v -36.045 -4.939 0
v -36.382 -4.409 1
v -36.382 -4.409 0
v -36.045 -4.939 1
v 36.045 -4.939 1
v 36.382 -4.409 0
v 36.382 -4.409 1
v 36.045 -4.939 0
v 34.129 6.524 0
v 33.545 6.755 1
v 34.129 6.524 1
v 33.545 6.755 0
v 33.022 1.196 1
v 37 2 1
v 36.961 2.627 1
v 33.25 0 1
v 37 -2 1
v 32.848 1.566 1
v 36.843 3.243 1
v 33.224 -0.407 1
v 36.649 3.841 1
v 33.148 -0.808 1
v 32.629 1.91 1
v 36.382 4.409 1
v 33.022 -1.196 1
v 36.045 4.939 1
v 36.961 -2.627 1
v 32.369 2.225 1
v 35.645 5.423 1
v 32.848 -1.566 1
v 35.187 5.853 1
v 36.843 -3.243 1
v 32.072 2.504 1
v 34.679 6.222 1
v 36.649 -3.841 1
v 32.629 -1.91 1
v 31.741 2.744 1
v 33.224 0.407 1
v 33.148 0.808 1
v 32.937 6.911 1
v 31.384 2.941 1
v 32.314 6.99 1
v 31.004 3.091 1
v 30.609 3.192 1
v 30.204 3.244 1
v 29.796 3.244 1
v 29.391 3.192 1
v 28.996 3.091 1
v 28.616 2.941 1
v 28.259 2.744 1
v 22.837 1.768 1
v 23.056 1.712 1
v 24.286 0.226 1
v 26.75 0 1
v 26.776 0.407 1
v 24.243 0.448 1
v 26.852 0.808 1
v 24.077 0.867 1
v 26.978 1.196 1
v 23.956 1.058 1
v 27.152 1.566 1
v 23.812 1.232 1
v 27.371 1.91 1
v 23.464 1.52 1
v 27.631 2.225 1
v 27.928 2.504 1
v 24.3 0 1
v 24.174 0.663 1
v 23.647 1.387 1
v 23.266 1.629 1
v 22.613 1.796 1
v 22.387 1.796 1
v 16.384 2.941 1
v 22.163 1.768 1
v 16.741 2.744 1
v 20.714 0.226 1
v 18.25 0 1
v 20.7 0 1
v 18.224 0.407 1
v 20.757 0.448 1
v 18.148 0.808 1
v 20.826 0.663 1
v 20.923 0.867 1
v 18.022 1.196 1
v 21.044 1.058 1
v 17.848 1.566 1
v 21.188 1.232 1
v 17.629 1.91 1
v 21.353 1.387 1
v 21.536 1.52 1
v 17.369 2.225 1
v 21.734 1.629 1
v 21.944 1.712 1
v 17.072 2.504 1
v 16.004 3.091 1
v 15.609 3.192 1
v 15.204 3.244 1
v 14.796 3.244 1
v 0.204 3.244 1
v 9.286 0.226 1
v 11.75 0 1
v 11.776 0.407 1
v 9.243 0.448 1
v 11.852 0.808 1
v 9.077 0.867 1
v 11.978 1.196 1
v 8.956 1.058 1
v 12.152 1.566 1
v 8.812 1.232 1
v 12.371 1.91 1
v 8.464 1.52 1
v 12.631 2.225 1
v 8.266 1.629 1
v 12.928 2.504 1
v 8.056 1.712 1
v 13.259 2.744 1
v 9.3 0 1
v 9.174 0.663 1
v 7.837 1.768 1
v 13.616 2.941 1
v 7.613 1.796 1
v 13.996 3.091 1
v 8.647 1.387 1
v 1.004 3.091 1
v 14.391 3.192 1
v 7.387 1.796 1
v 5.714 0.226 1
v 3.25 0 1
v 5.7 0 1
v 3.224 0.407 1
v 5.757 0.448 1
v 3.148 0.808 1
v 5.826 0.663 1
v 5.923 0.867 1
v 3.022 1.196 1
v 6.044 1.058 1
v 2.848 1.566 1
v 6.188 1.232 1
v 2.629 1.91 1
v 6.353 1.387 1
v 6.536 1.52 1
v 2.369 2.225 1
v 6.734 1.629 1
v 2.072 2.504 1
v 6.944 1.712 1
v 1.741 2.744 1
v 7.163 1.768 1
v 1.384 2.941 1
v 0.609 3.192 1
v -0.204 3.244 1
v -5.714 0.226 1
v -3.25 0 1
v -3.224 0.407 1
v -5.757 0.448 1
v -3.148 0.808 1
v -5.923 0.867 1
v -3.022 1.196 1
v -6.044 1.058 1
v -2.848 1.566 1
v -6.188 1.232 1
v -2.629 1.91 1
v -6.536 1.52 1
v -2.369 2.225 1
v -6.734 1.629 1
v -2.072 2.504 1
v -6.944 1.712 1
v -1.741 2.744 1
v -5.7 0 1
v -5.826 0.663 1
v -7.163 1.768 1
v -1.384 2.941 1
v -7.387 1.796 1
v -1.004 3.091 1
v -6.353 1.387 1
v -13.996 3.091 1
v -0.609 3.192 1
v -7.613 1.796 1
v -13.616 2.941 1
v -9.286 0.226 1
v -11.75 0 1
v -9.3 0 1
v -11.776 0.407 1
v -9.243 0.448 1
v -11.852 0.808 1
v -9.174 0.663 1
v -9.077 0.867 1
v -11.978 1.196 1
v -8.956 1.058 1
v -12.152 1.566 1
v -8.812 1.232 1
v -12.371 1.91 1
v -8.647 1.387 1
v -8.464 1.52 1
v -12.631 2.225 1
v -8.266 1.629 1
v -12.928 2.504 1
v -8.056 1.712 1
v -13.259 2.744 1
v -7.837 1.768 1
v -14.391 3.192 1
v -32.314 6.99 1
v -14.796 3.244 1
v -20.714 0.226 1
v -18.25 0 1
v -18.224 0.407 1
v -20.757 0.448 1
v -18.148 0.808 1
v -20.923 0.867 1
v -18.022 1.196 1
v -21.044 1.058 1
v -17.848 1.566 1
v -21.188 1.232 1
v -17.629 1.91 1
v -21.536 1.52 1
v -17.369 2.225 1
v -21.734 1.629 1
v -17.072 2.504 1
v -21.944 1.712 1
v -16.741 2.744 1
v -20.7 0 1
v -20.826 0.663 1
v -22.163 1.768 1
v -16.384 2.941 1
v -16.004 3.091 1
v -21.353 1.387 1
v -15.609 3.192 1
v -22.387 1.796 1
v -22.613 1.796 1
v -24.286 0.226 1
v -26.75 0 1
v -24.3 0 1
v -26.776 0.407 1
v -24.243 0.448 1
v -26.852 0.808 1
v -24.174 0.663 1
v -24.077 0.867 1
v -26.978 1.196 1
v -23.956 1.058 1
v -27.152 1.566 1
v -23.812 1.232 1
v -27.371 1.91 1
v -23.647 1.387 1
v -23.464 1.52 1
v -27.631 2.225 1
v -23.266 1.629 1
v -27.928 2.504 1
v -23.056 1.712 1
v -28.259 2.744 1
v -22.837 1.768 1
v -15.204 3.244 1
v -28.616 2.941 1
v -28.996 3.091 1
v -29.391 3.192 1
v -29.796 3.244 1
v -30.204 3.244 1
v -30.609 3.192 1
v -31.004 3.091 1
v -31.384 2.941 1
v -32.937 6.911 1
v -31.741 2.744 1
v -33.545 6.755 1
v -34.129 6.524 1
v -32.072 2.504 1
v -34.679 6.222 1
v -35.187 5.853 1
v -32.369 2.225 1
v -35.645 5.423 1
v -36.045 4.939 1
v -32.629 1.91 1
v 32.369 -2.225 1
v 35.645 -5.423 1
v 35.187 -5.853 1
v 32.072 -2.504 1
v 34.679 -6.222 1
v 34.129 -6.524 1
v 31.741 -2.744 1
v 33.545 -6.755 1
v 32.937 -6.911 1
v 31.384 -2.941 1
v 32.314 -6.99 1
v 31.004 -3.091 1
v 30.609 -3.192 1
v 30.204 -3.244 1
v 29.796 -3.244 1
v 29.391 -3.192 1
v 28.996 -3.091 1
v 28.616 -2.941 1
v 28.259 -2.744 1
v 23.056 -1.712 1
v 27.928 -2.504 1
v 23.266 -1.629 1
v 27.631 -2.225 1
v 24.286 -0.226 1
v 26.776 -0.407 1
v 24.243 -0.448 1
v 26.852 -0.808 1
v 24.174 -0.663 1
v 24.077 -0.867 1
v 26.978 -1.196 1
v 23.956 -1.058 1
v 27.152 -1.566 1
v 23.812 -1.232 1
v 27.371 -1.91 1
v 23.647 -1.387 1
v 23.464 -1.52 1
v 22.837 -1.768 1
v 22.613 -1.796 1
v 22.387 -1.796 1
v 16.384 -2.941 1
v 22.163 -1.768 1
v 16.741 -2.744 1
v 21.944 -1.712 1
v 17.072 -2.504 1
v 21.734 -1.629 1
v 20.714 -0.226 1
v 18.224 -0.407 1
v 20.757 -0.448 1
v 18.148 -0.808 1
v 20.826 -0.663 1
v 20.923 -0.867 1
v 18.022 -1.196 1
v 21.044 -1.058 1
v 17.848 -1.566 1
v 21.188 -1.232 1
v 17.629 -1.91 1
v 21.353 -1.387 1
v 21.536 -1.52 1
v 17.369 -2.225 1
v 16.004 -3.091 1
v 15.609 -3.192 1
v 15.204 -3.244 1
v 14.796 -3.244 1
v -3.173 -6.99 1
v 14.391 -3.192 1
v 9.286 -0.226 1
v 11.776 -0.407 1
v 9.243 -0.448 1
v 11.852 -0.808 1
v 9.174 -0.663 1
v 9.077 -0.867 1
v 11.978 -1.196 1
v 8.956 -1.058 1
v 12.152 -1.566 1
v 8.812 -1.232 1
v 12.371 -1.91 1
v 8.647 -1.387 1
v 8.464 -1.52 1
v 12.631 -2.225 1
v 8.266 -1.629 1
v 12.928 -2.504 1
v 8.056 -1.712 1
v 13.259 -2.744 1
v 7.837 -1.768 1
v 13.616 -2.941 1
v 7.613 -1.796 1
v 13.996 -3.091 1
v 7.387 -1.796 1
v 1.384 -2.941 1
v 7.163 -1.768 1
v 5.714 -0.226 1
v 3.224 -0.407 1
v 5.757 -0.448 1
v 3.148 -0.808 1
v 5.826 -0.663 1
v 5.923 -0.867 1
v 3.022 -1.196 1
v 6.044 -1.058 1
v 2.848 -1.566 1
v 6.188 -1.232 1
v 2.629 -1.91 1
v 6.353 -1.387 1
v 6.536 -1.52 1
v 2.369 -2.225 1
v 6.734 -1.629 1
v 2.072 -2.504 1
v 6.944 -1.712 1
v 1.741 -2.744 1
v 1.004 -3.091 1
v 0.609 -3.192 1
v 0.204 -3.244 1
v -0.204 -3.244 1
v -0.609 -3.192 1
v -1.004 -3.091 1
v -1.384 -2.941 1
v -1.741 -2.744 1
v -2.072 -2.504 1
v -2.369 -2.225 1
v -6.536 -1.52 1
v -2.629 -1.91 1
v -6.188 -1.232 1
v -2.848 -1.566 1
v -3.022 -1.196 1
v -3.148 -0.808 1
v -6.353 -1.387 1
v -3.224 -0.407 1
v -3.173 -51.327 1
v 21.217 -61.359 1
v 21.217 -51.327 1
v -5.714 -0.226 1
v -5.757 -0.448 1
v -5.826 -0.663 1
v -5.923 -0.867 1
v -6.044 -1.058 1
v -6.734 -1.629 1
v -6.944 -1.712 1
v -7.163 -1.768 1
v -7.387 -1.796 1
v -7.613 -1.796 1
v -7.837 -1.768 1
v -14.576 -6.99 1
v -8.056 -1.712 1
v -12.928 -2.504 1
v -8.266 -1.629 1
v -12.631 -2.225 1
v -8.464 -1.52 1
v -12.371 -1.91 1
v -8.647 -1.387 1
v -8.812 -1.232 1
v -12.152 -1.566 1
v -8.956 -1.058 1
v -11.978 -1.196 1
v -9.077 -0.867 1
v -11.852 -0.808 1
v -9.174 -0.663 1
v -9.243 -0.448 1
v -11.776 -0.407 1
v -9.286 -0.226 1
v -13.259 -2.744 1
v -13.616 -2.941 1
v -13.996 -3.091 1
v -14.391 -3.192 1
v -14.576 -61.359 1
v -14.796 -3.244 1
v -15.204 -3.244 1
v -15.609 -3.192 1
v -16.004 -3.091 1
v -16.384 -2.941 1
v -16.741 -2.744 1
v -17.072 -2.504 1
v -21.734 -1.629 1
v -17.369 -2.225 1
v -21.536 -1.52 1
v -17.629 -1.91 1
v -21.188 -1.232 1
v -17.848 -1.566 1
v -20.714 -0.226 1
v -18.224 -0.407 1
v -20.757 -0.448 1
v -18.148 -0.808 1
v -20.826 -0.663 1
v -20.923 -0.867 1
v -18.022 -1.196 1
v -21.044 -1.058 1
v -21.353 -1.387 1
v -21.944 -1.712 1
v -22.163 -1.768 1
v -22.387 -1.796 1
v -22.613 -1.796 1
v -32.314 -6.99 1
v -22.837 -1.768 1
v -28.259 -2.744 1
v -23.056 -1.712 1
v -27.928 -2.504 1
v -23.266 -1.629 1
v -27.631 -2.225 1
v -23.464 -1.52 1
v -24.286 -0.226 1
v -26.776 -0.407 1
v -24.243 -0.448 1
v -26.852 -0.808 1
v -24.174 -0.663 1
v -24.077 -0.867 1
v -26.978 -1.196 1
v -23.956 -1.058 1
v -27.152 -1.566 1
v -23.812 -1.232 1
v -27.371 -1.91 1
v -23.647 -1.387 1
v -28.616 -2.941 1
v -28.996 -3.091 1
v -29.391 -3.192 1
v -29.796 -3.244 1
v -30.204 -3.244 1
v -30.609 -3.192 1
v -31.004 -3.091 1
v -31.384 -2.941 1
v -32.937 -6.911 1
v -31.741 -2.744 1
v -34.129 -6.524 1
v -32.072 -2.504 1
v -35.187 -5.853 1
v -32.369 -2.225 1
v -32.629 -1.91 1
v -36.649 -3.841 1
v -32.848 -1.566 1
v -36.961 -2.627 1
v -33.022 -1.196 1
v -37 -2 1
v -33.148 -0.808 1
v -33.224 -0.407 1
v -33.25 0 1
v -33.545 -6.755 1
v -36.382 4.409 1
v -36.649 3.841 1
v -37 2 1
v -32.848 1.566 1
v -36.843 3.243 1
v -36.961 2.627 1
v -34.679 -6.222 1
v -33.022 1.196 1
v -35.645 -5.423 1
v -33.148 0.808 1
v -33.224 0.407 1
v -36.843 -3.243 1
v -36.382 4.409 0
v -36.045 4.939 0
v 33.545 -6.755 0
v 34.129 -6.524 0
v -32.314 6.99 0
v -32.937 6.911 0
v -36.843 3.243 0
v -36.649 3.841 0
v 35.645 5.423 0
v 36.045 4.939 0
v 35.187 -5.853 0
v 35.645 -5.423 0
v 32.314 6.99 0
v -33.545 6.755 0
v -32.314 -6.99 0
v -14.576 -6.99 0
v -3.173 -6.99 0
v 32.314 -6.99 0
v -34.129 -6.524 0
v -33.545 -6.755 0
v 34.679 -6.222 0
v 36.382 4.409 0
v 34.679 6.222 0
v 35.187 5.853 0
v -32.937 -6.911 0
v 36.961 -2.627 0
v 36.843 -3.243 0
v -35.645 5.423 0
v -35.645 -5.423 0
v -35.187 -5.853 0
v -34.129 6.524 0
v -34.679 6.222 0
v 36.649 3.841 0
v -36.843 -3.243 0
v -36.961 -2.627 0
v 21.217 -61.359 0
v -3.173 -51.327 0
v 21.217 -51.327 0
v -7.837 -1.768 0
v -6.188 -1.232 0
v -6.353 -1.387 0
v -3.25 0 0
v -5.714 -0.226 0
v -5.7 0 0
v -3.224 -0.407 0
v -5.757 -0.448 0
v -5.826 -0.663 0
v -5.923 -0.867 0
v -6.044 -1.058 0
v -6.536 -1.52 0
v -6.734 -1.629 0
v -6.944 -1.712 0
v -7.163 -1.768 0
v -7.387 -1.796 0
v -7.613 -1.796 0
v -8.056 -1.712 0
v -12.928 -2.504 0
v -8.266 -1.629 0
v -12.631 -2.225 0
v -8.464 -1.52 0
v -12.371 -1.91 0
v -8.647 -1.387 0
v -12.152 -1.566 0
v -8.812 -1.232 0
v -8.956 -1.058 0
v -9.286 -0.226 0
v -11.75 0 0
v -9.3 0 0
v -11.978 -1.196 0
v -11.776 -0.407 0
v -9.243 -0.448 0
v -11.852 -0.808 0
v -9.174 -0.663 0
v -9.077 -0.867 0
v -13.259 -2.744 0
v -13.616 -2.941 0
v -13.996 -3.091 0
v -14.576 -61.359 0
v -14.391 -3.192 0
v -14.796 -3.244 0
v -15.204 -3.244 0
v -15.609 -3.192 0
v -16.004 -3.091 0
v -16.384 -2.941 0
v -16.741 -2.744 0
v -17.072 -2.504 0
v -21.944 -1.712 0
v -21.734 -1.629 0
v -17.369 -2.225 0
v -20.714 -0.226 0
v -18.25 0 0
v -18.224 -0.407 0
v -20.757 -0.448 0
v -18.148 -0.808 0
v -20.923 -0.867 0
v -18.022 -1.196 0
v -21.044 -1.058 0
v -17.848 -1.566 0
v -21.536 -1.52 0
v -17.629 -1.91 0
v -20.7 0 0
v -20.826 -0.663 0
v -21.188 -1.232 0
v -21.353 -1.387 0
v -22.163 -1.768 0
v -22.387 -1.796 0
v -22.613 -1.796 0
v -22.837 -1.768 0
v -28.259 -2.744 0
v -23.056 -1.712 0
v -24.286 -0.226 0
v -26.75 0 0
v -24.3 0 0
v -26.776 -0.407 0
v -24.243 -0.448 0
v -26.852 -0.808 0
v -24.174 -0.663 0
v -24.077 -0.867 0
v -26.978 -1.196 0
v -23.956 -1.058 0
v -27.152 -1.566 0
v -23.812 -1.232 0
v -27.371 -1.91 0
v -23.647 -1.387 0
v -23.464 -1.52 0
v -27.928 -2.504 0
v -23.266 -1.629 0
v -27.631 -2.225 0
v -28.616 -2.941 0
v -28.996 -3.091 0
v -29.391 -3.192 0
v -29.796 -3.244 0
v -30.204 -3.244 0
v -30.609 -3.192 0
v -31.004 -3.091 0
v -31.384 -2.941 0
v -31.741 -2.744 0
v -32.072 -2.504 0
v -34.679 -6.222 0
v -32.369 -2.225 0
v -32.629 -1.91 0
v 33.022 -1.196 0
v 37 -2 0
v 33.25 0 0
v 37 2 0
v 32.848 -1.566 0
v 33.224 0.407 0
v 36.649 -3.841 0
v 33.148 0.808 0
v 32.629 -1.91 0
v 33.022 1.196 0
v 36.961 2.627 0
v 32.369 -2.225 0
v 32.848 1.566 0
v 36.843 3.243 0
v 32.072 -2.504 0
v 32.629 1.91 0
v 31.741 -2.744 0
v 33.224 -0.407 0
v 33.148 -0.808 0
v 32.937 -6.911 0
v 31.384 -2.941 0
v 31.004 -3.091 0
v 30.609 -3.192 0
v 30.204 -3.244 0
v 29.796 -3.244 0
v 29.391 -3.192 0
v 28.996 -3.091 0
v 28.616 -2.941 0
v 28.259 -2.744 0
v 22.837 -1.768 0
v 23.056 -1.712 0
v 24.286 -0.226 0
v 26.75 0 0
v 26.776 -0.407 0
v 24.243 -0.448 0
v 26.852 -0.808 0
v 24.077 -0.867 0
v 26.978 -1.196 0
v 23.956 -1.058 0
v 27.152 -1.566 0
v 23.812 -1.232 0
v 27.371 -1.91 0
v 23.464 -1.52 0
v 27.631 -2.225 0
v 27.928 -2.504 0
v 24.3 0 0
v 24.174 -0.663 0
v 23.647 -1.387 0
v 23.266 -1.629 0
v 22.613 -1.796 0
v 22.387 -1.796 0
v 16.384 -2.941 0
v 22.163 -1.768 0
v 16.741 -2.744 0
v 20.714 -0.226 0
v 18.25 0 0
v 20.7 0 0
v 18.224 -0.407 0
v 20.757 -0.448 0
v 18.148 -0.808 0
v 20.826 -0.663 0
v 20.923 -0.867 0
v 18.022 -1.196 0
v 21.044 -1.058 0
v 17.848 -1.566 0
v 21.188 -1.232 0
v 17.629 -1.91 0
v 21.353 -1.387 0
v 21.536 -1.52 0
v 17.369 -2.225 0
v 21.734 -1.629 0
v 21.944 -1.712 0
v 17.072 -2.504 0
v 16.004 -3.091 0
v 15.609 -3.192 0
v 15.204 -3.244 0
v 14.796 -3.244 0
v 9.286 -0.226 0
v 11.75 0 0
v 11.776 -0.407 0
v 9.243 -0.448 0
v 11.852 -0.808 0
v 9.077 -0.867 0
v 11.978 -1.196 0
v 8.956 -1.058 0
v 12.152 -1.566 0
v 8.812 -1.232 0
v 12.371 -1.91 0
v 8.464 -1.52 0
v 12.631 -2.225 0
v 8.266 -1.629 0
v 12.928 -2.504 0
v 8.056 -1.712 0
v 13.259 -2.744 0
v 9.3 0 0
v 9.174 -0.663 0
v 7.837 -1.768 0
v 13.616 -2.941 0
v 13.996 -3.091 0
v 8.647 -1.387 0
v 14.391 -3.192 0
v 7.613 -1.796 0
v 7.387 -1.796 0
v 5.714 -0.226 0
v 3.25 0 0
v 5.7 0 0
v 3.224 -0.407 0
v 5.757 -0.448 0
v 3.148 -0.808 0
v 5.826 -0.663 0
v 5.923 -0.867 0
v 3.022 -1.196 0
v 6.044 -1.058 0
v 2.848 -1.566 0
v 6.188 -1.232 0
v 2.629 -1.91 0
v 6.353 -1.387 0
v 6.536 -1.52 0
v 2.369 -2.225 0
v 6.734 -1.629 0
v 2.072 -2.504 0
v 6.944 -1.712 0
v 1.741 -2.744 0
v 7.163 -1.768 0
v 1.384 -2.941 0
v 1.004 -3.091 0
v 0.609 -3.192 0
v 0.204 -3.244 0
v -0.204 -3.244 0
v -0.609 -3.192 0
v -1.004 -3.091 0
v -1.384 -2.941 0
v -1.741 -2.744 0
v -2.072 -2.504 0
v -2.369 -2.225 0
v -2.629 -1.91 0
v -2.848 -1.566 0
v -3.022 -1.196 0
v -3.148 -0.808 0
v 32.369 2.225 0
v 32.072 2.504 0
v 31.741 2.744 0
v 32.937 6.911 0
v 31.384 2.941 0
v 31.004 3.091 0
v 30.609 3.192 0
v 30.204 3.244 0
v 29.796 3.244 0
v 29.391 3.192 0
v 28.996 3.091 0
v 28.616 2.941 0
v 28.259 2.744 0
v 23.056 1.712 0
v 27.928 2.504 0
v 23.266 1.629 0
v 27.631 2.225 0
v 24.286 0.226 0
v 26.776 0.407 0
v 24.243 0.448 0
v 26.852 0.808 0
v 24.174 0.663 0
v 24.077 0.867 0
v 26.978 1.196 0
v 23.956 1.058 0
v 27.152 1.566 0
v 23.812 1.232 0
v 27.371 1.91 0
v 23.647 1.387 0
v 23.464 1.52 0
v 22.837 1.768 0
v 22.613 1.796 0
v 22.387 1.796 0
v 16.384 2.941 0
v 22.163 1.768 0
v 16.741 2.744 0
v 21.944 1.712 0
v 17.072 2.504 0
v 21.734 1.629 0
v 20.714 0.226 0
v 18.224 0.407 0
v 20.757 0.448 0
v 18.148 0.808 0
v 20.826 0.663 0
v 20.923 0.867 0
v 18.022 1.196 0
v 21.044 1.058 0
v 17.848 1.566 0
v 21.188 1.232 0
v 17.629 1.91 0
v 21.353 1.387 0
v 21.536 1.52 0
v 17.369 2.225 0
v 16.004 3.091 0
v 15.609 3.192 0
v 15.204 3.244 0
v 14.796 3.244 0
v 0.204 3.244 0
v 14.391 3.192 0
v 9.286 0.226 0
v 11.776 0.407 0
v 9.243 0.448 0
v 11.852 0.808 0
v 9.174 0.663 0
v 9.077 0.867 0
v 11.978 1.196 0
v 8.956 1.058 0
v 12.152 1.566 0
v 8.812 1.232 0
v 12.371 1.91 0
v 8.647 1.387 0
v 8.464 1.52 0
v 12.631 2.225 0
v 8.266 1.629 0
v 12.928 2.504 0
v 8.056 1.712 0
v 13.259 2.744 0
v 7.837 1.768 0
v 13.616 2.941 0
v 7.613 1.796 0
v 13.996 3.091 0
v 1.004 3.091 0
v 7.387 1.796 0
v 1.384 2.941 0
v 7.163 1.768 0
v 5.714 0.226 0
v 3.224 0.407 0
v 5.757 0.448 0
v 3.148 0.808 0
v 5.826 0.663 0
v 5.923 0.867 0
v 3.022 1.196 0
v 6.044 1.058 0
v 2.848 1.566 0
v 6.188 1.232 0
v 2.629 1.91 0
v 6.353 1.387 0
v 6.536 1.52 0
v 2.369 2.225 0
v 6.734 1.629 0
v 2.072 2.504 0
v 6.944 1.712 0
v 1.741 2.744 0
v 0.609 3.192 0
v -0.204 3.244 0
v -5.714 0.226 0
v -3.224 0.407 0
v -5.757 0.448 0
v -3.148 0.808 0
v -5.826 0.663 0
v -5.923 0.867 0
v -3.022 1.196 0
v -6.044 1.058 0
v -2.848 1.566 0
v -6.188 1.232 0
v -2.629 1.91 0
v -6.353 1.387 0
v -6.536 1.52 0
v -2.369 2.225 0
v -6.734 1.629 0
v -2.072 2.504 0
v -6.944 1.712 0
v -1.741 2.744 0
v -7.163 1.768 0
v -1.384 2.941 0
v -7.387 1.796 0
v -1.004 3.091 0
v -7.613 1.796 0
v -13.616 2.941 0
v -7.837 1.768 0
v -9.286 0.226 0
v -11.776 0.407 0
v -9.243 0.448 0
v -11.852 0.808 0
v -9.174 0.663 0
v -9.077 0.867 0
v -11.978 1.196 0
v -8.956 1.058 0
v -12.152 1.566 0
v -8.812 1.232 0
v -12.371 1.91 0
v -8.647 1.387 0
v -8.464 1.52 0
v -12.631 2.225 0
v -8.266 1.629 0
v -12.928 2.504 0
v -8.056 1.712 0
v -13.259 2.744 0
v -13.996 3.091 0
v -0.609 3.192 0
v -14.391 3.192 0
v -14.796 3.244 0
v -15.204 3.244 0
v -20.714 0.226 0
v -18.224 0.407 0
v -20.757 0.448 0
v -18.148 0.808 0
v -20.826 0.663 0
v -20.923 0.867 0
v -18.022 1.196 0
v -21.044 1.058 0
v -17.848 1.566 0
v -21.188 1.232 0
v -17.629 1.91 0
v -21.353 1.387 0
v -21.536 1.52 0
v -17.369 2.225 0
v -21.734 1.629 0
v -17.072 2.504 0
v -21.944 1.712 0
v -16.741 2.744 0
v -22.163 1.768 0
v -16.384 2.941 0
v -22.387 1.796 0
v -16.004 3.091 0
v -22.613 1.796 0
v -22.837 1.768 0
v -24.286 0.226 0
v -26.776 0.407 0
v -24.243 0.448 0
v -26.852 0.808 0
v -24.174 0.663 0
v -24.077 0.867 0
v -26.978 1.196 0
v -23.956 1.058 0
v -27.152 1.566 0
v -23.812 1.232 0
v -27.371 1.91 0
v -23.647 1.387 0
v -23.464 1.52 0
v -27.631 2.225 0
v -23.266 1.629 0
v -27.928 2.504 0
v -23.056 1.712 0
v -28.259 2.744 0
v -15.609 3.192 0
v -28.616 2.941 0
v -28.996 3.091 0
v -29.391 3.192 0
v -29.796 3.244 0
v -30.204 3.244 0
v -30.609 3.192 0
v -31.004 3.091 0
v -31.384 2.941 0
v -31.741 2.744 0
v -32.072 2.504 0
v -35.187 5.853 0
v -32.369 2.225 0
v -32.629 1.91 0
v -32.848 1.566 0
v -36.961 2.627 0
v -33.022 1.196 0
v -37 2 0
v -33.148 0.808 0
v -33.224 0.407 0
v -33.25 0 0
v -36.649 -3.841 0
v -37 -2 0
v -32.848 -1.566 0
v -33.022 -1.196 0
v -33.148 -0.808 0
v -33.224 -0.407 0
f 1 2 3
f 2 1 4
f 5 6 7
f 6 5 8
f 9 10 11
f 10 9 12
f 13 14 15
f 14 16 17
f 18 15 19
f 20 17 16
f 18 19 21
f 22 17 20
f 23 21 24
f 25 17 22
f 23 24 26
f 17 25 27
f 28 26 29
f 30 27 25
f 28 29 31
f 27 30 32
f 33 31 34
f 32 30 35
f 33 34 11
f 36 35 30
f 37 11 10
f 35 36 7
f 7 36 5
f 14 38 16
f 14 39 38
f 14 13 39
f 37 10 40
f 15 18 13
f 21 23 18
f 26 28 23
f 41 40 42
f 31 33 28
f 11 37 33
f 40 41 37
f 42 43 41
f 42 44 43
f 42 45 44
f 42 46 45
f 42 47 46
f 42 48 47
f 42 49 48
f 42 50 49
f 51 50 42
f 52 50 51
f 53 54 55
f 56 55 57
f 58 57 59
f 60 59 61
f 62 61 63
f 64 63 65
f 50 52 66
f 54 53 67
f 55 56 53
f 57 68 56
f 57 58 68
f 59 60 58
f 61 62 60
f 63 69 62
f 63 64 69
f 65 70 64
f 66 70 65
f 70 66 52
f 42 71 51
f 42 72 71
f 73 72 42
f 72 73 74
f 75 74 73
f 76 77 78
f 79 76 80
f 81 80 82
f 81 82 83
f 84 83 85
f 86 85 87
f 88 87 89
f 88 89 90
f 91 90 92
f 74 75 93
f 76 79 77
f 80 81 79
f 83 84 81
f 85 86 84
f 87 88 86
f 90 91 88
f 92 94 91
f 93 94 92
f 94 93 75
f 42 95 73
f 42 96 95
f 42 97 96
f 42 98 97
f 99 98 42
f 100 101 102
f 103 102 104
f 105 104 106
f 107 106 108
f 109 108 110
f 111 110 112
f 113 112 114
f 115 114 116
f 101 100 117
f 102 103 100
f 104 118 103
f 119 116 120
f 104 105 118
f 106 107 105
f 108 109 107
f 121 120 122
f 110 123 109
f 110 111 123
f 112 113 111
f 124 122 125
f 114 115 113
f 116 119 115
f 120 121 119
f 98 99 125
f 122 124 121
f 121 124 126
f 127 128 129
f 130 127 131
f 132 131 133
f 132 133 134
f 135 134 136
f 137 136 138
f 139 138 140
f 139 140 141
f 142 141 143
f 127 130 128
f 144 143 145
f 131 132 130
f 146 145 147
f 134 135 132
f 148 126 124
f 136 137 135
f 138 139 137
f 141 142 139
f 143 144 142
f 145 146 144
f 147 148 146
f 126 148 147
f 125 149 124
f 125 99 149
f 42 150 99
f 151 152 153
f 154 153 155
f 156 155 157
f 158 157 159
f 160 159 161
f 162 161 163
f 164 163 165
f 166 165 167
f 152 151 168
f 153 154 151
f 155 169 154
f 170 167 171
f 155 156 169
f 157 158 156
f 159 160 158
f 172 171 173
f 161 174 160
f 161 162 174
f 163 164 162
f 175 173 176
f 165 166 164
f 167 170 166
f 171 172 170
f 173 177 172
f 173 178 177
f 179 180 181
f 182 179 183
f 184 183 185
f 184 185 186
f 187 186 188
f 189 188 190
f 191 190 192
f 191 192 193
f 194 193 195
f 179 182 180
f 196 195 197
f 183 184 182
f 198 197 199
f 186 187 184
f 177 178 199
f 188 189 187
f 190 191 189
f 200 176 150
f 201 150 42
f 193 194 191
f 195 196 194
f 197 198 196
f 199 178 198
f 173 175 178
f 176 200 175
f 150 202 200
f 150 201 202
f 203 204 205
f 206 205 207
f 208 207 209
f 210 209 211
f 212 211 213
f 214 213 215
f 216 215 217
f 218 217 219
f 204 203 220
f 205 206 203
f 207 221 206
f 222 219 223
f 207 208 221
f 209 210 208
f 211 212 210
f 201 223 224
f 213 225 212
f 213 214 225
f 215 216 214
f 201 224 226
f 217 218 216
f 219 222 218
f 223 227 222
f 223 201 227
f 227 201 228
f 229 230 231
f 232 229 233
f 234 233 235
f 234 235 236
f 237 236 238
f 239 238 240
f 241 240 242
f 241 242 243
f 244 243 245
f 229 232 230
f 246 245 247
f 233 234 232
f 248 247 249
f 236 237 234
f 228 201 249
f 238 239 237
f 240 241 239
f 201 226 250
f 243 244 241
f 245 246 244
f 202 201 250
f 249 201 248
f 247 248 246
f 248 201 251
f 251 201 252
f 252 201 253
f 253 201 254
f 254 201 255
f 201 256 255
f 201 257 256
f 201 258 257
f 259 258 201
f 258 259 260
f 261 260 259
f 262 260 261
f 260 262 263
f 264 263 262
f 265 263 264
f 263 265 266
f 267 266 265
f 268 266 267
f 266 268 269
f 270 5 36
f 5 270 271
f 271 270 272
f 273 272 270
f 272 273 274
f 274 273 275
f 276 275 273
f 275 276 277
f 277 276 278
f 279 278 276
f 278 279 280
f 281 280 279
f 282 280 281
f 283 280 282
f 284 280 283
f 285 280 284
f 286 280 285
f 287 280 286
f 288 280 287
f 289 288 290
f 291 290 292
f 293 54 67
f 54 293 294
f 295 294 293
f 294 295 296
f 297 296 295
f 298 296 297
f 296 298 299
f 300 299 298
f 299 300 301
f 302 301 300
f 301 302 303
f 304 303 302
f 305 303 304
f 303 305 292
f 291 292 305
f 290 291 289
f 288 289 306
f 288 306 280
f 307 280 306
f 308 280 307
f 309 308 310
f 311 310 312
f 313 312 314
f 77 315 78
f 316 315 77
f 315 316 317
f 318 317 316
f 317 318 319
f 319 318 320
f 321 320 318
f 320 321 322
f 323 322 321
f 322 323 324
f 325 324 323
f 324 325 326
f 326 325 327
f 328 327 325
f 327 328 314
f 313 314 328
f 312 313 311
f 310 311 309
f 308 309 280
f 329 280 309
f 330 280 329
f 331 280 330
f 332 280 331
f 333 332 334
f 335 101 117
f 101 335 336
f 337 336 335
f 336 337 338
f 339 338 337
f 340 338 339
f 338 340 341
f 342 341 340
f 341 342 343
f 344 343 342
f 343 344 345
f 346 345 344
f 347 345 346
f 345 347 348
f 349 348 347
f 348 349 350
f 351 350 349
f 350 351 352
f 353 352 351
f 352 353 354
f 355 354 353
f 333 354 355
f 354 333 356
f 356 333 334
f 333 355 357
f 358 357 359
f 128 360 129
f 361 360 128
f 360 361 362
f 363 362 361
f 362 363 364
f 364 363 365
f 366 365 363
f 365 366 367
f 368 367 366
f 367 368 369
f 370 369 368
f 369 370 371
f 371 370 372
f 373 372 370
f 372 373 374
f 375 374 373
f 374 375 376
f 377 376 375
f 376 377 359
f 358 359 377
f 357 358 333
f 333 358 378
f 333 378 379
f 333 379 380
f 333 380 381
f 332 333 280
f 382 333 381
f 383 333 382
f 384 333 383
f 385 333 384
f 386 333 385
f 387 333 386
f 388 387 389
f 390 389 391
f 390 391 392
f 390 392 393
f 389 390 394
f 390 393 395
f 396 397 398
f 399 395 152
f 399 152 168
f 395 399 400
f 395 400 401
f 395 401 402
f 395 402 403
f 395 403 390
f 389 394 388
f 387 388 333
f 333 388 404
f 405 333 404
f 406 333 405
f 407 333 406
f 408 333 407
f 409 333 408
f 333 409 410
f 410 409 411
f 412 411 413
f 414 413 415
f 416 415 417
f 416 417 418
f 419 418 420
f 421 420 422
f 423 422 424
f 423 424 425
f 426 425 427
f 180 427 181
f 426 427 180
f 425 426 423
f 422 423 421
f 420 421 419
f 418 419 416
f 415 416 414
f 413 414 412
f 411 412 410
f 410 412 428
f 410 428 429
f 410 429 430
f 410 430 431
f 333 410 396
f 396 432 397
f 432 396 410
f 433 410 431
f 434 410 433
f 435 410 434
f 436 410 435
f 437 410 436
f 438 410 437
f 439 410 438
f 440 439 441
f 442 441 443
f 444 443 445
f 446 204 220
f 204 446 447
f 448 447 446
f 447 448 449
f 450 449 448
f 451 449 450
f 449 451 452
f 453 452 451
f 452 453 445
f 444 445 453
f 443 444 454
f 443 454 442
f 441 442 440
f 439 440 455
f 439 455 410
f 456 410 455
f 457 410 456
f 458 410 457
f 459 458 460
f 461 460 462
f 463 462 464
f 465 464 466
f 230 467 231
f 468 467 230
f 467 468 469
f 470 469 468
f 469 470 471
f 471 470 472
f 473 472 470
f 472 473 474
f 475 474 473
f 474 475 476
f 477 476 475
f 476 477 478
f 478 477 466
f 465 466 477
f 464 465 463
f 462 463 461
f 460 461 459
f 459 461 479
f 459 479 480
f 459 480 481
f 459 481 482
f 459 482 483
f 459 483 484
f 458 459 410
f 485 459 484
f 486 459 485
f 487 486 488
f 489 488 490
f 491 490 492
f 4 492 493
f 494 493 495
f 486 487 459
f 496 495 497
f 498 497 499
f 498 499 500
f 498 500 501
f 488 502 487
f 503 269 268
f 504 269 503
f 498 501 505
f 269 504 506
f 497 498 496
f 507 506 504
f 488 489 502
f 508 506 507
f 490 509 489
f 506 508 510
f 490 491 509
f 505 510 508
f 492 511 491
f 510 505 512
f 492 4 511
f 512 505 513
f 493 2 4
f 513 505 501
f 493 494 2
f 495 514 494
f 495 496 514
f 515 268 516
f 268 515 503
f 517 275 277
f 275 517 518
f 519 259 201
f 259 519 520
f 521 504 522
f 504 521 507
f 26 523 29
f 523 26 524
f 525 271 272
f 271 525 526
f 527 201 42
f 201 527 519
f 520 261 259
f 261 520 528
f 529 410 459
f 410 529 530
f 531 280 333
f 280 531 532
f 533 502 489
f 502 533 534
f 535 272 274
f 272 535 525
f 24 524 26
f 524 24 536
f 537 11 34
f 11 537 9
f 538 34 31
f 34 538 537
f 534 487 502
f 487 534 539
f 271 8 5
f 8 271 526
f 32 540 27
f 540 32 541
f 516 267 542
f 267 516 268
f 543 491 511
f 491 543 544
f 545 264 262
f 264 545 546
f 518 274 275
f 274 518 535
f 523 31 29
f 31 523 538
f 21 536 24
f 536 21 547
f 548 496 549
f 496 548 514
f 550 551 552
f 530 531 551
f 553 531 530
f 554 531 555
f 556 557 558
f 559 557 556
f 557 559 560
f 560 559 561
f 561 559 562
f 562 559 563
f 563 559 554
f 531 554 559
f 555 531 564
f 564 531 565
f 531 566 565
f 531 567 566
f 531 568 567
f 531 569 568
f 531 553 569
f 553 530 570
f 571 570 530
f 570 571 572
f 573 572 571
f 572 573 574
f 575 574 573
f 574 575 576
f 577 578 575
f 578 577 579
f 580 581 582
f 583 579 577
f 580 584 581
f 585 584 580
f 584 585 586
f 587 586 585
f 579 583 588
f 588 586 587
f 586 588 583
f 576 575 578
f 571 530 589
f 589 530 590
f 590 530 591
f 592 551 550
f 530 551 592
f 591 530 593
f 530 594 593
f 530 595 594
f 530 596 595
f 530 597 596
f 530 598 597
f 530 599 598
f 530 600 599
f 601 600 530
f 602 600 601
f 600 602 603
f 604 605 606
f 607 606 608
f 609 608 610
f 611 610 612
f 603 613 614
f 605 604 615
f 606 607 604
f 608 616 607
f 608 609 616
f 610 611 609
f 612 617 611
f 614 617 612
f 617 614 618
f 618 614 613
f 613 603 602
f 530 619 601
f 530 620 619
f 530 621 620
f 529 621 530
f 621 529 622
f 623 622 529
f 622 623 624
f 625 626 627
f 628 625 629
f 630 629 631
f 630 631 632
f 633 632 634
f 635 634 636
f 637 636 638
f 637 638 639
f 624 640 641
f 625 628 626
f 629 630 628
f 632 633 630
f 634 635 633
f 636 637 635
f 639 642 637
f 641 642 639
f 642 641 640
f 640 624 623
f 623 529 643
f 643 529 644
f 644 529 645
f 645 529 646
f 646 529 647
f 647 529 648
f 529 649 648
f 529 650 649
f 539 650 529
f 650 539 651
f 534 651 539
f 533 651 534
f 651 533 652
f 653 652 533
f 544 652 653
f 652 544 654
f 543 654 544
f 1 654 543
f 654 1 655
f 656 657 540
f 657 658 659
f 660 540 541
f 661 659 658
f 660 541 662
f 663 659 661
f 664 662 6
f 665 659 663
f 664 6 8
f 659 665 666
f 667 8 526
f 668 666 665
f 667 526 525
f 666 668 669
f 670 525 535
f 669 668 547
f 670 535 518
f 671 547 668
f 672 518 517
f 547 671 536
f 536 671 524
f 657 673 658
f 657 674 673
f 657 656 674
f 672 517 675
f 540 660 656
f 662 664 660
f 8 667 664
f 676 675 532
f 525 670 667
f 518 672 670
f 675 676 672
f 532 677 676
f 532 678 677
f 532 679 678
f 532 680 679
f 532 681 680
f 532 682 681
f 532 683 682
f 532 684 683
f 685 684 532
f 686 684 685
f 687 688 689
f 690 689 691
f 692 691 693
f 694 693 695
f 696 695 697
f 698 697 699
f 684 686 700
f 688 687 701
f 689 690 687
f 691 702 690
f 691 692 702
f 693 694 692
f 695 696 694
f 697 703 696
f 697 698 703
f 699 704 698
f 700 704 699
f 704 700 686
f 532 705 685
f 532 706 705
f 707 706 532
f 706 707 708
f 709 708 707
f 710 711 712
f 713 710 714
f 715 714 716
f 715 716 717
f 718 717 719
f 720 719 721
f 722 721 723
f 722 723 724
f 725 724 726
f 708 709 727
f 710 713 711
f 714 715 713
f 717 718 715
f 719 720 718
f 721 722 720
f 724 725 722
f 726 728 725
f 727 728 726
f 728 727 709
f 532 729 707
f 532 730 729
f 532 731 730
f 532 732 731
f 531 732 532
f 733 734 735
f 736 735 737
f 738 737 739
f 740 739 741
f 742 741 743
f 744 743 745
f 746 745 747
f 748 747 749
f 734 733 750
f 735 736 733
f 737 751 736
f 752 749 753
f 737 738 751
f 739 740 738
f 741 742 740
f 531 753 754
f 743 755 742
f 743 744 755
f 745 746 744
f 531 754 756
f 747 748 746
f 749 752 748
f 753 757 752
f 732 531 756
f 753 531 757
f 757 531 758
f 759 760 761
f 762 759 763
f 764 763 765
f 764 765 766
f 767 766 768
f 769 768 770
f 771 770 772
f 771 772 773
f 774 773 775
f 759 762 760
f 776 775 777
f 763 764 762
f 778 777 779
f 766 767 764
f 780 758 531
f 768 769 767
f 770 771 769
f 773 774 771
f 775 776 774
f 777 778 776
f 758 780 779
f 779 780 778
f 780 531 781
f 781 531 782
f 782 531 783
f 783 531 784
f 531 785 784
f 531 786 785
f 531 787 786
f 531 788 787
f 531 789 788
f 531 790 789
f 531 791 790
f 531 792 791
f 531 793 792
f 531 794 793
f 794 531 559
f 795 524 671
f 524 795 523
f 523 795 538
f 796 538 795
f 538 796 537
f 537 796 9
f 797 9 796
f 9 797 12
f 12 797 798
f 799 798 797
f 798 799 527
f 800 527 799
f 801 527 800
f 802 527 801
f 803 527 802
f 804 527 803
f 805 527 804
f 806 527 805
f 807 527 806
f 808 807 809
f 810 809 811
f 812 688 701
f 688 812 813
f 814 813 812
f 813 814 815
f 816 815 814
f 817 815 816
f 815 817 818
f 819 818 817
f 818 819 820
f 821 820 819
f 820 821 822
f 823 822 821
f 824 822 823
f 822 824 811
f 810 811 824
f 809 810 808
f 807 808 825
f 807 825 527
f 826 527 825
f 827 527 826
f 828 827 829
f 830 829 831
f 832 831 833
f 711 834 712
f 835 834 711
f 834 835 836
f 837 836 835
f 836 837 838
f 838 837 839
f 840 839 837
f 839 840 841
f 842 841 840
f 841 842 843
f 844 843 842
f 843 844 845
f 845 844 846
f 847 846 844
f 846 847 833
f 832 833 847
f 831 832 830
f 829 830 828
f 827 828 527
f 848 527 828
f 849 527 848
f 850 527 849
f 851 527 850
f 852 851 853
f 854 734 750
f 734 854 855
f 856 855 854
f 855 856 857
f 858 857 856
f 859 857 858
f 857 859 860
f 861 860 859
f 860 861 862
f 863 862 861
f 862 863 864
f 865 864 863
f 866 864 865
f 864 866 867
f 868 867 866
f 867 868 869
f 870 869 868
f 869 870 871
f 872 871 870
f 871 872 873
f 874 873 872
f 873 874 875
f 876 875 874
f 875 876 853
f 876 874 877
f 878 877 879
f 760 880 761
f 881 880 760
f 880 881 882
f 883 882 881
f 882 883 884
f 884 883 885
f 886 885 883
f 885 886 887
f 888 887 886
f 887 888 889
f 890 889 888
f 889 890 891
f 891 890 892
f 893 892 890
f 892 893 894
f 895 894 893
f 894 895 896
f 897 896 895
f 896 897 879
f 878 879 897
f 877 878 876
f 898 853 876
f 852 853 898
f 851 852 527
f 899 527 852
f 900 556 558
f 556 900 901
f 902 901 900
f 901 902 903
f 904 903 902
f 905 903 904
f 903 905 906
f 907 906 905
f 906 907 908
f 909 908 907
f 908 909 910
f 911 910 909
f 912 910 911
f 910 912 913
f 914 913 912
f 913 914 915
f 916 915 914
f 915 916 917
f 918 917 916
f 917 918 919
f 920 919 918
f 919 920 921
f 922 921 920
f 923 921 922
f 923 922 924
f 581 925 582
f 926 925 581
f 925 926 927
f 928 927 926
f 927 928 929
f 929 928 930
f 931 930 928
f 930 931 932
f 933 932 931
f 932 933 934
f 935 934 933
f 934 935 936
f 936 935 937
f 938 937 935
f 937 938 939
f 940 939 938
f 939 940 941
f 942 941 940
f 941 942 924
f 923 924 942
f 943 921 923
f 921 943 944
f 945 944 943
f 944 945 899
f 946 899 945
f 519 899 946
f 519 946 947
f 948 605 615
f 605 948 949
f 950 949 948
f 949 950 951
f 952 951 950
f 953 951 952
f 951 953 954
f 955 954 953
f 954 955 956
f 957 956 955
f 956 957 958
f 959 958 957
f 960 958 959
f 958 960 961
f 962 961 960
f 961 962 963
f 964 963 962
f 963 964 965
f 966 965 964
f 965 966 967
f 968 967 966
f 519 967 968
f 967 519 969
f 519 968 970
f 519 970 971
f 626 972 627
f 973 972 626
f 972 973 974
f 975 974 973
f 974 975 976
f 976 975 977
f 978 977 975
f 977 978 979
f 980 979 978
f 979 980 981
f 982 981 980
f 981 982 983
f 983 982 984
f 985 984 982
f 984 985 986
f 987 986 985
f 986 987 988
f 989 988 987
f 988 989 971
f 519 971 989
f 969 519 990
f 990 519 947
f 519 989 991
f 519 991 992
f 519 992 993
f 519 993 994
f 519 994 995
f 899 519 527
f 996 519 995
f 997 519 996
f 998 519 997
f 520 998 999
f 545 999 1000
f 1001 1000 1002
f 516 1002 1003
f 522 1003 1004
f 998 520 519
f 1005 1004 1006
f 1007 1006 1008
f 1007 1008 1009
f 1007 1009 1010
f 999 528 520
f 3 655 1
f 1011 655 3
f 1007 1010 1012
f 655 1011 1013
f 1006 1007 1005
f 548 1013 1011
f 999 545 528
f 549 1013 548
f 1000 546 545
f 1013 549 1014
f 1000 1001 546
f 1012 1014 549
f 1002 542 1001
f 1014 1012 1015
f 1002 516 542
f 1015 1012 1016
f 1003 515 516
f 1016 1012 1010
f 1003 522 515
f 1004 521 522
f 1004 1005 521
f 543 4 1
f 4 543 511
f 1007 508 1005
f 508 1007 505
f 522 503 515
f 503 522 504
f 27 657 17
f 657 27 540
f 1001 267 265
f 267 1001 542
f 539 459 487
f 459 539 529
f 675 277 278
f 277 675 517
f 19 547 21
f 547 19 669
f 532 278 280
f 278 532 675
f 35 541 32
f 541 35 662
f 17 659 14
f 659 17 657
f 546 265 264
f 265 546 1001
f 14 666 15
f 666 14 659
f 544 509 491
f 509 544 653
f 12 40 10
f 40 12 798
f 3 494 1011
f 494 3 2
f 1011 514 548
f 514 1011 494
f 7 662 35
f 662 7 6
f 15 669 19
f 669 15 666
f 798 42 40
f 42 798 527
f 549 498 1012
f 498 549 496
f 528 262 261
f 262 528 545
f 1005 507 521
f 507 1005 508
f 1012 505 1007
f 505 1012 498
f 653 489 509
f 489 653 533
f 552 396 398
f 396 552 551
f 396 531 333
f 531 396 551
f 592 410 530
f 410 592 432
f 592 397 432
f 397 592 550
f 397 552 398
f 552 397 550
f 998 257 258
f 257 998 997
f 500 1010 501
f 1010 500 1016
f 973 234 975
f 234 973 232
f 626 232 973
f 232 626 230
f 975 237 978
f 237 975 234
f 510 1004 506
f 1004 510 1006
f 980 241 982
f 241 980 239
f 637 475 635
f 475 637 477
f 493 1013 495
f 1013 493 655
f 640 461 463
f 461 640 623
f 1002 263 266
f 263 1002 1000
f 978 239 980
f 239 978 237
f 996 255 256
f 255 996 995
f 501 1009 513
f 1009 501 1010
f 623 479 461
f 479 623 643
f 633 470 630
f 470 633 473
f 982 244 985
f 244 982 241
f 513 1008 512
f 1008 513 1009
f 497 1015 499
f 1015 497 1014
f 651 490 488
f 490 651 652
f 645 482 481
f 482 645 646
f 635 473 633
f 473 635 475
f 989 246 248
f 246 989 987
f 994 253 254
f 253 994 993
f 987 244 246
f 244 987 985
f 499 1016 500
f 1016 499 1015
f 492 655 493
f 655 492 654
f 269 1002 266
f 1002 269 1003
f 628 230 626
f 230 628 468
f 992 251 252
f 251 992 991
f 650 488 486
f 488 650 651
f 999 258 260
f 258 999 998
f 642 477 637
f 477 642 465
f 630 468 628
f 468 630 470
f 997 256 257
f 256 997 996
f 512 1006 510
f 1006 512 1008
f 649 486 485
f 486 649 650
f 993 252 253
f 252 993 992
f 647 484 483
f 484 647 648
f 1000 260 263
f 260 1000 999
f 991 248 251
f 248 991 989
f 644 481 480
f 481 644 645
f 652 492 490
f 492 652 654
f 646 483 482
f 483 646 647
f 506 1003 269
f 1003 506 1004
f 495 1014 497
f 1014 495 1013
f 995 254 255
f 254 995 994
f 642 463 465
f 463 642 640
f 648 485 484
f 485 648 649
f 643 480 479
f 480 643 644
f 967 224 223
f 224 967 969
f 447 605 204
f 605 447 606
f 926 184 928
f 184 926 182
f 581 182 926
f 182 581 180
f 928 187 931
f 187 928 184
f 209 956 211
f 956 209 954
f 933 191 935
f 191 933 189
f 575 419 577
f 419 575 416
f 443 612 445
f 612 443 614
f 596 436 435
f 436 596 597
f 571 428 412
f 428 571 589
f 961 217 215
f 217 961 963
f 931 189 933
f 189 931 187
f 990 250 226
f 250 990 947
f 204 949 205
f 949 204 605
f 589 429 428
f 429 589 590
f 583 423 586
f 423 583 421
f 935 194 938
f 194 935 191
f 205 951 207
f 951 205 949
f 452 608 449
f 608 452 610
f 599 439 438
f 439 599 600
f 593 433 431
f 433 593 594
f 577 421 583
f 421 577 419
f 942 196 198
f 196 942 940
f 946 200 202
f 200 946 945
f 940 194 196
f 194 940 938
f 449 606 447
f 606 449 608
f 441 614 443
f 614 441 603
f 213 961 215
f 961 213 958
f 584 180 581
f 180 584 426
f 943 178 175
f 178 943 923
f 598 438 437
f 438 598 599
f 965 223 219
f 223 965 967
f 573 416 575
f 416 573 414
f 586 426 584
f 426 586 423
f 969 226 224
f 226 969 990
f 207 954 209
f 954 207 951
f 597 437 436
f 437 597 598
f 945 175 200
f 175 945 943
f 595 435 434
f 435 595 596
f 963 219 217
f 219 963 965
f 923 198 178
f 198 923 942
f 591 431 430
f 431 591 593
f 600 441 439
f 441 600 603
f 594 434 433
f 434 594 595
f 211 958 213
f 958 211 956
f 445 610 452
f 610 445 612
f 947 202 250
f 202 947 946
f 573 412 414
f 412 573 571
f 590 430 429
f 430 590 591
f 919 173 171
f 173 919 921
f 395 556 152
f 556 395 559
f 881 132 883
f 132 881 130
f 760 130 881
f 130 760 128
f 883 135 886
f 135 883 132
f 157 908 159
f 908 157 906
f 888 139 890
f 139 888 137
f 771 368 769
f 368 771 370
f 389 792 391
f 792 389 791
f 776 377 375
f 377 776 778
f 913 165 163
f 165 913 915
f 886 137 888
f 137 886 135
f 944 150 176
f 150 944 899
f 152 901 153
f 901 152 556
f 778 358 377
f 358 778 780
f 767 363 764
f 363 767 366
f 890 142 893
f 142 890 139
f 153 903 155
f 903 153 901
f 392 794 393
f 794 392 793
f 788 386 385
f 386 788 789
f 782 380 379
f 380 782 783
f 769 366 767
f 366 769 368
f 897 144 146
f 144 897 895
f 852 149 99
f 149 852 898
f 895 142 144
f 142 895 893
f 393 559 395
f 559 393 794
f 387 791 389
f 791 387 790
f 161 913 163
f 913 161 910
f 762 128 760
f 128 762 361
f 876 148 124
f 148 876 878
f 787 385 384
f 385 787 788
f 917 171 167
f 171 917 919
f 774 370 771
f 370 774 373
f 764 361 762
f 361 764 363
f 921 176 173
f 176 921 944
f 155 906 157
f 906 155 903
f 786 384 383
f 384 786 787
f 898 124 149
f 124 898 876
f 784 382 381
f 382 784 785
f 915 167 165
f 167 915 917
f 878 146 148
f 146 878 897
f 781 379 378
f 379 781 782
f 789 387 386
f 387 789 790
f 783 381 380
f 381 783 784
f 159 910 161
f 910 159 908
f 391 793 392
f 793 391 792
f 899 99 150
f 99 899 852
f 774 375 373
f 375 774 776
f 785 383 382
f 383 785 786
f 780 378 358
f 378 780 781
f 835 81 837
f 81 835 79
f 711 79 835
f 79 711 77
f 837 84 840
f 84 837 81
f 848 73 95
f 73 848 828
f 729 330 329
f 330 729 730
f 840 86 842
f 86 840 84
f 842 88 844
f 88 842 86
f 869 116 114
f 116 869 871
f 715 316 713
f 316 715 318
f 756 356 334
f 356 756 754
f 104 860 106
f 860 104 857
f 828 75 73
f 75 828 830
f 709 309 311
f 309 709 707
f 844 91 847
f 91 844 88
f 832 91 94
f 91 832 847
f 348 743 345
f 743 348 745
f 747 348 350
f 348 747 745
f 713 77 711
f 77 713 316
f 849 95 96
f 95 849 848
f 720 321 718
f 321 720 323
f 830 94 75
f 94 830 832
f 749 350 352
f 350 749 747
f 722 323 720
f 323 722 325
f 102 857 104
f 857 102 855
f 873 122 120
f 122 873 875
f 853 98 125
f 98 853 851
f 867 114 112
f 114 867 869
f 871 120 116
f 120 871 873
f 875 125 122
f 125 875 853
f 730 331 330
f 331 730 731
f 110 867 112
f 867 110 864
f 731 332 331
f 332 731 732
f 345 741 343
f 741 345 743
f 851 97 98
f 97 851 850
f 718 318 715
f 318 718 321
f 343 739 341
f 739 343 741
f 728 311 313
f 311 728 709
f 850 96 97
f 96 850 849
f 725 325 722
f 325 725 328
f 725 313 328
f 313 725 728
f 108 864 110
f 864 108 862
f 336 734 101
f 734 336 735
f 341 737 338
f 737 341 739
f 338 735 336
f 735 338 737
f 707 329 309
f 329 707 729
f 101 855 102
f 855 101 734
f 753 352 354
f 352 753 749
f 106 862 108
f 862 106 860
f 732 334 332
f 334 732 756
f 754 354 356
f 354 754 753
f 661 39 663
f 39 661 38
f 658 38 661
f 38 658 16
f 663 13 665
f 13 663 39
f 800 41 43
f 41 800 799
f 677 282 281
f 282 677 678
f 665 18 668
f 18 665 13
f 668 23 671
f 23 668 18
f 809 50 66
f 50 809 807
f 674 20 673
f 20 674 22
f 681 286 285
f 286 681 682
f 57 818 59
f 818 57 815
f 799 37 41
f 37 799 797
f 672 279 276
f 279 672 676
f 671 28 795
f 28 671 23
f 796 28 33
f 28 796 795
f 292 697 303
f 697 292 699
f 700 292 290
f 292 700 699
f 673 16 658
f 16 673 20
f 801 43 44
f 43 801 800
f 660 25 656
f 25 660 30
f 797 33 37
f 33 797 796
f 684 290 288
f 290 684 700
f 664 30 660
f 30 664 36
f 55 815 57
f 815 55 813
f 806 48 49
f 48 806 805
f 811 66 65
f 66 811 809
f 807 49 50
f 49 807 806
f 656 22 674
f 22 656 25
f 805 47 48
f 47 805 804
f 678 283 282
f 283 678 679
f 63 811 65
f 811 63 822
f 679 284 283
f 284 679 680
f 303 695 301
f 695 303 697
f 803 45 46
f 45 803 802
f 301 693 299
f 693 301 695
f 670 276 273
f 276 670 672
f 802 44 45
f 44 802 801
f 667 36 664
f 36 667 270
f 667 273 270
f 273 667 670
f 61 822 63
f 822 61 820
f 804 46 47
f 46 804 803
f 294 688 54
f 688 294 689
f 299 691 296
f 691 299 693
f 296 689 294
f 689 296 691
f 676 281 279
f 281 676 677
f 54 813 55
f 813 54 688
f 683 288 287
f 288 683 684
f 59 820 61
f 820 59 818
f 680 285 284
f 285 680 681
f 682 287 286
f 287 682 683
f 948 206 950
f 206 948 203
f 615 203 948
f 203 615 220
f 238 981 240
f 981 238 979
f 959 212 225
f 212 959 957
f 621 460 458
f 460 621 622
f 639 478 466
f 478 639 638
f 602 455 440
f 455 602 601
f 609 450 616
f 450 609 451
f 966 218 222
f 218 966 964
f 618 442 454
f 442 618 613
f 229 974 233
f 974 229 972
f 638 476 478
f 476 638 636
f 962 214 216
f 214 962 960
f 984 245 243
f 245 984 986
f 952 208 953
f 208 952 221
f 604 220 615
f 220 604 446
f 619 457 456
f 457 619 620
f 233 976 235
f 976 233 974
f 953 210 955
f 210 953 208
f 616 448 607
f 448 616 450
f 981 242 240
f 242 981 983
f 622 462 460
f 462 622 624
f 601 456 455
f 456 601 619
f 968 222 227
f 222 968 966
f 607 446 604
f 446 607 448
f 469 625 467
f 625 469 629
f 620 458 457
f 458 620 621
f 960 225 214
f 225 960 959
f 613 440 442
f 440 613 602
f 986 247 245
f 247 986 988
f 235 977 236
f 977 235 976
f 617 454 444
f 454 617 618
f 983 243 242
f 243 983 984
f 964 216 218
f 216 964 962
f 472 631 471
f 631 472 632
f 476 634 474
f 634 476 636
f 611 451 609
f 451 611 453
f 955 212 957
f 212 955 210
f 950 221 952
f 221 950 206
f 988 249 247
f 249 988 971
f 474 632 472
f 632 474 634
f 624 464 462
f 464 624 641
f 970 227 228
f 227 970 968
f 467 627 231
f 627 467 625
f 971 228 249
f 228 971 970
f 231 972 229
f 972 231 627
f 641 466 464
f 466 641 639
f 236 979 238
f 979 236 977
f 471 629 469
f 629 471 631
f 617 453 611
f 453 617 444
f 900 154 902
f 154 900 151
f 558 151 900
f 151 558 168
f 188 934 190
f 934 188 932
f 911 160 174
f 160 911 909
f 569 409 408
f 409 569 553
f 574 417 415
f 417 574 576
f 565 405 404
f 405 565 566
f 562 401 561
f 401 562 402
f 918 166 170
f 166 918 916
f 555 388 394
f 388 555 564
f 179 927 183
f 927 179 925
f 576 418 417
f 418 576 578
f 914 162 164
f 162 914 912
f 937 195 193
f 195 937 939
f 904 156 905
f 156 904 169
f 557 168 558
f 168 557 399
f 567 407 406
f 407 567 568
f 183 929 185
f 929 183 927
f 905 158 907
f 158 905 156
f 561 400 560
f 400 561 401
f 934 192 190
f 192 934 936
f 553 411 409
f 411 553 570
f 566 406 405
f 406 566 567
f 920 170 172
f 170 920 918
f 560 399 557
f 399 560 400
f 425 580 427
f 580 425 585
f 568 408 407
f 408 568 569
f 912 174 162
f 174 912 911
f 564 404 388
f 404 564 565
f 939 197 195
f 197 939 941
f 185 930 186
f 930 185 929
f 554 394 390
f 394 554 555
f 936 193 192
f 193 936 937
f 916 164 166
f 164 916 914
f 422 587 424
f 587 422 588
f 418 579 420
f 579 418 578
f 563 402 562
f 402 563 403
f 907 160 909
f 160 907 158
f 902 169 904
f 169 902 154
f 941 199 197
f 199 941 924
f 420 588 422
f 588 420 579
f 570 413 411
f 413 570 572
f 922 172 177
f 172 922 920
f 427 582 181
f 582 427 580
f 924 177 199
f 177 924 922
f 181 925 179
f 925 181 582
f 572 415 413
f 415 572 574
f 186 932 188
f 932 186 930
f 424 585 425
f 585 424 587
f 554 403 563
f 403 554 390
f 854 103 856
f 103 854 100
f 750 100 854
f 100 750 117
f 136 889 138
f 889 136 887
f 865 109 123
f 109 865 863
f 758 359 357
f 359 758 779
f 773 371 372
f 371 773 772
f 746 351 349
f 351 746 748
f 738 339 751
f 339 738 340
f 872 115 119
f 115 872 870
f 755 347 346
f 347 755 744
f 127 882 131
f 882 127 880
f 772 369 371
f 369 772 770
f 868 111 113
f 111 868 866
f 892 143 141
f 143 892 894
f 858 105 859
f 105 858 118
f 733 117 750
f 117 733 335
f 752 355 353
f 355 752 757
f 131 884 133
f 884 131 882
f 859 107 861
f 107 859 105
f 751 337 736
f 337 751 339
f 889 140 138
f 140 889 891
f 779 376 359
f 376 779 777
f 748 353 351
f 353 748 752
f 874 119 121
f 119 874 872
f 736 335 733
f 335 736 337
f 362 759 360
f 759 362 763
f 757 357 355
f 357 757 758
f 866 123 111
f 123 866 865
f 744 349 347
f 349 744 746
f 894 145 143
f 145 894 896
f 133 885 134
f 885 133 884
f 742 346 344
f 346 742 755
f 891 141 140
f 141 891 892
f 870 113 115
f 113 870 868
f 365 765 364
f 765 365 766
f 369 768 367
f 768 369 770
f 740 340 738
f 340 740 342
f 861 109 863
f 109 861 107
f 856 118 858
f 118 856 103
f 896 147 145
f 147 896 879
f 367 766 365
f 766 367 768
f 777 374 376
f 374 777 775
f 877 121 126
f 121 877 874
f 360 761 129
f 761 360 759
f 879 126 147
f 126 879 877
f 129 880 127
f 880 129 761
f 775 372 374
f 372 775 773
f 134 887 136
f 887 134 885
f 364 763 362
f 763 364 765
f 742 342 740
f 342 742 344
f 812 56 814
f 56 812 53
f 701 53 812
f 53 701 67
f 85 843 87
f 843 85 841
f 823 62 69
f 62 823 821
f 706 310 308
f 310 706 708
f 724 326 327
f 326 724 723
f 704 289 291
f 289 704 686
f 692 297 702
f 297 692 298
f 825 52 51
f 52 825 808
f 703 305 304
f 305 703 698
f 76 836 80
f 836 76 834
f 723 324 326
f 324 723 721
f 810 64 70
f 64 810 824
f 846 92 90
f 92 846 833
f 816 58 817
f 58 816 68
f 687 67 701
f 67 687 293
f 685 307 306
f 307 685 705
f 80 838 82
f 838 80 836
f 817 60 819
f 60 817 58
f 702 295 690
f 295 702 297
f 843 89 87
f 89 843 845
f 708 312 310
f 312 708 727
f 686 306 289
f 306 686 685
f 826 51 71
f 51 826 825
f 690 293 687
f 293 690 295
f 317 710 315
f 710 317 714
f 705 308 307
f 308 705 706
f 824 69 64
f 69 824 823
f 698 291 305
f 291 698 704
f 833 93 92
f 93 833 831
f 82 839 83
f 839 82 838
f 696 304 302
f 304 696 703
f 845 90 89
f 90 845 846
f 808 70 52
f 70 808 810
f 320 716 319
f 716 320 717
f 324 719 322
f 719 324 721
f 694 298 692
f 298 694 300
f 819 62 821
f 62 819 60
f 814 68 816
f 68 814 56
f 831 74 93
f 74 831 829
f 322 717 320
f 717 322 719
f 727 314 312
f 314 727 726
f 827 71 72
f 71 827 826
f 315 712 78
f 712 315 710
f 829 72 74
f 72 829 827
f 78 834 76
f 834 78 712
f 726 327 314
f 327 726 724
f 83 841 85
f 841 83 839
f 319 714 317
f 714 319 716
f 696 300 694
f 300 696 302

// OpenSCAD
$fn = 50;


difference() {
	union() {
		*color(alpha = 1.0000000000, c = "gray") {
			translate(v = [0, 14, 0]) {
				linear_extrude(height = 1) {
					text(font = "Arial:style=Bold", halign = "center", size = 4.5000000000, text = "COMMENT description oobb_plate_shape_p_type_1_depth_5_width_1_thickness_l_extra_oobb_size", valign = "center");
				}
			}
		}
		hull() {
			translate(v = [-32.0000000000, 2.0000000000, 0]) {
				cylinder(h = 1, r = 5);
			}
			translate(v = [32.0000000000, 2.0000000000, 0]) {
				cylinder(h = 1, r = 5);
			}
			translate(v = [-32.0000000000, -2.0000000000, 0]) {
				cylinder(h = 1, r = 5);
			}
			translate(v = [32.0000000000, -2.0000000000, 0]) {
				cylinder(h = 1, r = 5);
			}
		}
		translate(v = [0, -5, 0]) {
			linear_extrude(height = 1) {
				text(font = "DejaVu Sans Mono:style=Bold", halign = "center", size = 57.0000000000, text = "L", valign = "top");
			}
		}
	}
	union() {
		*color(alpha = 1.0000000000, c = "gray") {
			translate(v = [0, 14, 0]) {
				linear_extrude(height = 1) {
					text(font = "Arial:style=Bold", halign = "center", size = 4.5000000000, text = "COMMENT description oobb_holes_shape_n_type_5_width_1_thickness_l_extra_oobb_size_1_height_'all'_holes_true_both_holes", valign = "center");
				}
			}
		}
		translate(v = [-30.0000000000, 0.0000000000, 0]) {
			translate(v = [0, 0, -50]) {
				cylinder(h = 100, r = 3.2500000000);
			}
		}
		translate(v = [-15.0000000000, 0.0000000000, 0]) {
			translate(v = [0, 0, -50]) {
				cylinder(h = 100, r = 3.2500000000);
			}
		}
		translate(v = [0, 0, -50]) {
			cylinder(h = 100, r = 3.2500000000);
		}
		translate(v = [15.0000000000, 0.0000000000, 0]) {
			translate(v = [0, 0, -50]) {
				cylinder(h = 100, r = 3.2500000000);
			}
		}
		translate(v = [30.0000000000, 0.0000000000, 0]) {
			translate(v = [0, 0, -50]) {
				cylinder(h = 100, r = 3.2500000000);
			}
		}
		translate(v = [-30.0000000000, 0.0000000000, 0]) {
			translate(v = [0, 0, -50]) {
				cylinder(h = 100, r = 1.8000000000);
			}
		}
		translate(v = [-22.5000000000, 0.0000000000, 0]) {
			translate(v = [0, 0, -50]) {
				cylinder(h = 100, r = 1.8000000000);
			}
		}
		translate(v = [-15.0000000000, 0.0000000000, 0]) {
			translate(v = [0, 0, -50]) {
				cylinder(h = 100, r = 1.8000000000);
			}
		}
		translate(v = [-7.5000000000, 0.0000000000, 0]) {
			translate(v = [0, 0, -50]) {
				cylinder(h = 100, r = 1.8000000000);
			}
		}
		translate(v = [0, 0, -50]) {
			cylinder(h = 100, r = 1.8000000000);
		}
		translate(v = [7.5000000000, 0.0000000000, 0]) {
			translate(v = [0, 0, -50]) {
				cylinder(h = 100, r = 1.8000000000);
			}
		}
		translate(v = [15.0000000000, 0.0000000000, 0]) {
			translate(v = [0, 0, -50]) {
				cylinder(h = 100, r = 1.8000000000);
			}
		}
		translate(v = [22.5000000000, 0.0000000000, 0]) {
			translate(v = [0, 0, -50]) {
				cylinder(h = 100, r = 1.8000000000);
			}
		}
		translate(v = [30.0000000000, 0.0000000000, 0]) {
			translate(v = [0, 0, -50]) {
				cylinder(h = 100, r = 1.8000000000);
			}
		}
	}
}
